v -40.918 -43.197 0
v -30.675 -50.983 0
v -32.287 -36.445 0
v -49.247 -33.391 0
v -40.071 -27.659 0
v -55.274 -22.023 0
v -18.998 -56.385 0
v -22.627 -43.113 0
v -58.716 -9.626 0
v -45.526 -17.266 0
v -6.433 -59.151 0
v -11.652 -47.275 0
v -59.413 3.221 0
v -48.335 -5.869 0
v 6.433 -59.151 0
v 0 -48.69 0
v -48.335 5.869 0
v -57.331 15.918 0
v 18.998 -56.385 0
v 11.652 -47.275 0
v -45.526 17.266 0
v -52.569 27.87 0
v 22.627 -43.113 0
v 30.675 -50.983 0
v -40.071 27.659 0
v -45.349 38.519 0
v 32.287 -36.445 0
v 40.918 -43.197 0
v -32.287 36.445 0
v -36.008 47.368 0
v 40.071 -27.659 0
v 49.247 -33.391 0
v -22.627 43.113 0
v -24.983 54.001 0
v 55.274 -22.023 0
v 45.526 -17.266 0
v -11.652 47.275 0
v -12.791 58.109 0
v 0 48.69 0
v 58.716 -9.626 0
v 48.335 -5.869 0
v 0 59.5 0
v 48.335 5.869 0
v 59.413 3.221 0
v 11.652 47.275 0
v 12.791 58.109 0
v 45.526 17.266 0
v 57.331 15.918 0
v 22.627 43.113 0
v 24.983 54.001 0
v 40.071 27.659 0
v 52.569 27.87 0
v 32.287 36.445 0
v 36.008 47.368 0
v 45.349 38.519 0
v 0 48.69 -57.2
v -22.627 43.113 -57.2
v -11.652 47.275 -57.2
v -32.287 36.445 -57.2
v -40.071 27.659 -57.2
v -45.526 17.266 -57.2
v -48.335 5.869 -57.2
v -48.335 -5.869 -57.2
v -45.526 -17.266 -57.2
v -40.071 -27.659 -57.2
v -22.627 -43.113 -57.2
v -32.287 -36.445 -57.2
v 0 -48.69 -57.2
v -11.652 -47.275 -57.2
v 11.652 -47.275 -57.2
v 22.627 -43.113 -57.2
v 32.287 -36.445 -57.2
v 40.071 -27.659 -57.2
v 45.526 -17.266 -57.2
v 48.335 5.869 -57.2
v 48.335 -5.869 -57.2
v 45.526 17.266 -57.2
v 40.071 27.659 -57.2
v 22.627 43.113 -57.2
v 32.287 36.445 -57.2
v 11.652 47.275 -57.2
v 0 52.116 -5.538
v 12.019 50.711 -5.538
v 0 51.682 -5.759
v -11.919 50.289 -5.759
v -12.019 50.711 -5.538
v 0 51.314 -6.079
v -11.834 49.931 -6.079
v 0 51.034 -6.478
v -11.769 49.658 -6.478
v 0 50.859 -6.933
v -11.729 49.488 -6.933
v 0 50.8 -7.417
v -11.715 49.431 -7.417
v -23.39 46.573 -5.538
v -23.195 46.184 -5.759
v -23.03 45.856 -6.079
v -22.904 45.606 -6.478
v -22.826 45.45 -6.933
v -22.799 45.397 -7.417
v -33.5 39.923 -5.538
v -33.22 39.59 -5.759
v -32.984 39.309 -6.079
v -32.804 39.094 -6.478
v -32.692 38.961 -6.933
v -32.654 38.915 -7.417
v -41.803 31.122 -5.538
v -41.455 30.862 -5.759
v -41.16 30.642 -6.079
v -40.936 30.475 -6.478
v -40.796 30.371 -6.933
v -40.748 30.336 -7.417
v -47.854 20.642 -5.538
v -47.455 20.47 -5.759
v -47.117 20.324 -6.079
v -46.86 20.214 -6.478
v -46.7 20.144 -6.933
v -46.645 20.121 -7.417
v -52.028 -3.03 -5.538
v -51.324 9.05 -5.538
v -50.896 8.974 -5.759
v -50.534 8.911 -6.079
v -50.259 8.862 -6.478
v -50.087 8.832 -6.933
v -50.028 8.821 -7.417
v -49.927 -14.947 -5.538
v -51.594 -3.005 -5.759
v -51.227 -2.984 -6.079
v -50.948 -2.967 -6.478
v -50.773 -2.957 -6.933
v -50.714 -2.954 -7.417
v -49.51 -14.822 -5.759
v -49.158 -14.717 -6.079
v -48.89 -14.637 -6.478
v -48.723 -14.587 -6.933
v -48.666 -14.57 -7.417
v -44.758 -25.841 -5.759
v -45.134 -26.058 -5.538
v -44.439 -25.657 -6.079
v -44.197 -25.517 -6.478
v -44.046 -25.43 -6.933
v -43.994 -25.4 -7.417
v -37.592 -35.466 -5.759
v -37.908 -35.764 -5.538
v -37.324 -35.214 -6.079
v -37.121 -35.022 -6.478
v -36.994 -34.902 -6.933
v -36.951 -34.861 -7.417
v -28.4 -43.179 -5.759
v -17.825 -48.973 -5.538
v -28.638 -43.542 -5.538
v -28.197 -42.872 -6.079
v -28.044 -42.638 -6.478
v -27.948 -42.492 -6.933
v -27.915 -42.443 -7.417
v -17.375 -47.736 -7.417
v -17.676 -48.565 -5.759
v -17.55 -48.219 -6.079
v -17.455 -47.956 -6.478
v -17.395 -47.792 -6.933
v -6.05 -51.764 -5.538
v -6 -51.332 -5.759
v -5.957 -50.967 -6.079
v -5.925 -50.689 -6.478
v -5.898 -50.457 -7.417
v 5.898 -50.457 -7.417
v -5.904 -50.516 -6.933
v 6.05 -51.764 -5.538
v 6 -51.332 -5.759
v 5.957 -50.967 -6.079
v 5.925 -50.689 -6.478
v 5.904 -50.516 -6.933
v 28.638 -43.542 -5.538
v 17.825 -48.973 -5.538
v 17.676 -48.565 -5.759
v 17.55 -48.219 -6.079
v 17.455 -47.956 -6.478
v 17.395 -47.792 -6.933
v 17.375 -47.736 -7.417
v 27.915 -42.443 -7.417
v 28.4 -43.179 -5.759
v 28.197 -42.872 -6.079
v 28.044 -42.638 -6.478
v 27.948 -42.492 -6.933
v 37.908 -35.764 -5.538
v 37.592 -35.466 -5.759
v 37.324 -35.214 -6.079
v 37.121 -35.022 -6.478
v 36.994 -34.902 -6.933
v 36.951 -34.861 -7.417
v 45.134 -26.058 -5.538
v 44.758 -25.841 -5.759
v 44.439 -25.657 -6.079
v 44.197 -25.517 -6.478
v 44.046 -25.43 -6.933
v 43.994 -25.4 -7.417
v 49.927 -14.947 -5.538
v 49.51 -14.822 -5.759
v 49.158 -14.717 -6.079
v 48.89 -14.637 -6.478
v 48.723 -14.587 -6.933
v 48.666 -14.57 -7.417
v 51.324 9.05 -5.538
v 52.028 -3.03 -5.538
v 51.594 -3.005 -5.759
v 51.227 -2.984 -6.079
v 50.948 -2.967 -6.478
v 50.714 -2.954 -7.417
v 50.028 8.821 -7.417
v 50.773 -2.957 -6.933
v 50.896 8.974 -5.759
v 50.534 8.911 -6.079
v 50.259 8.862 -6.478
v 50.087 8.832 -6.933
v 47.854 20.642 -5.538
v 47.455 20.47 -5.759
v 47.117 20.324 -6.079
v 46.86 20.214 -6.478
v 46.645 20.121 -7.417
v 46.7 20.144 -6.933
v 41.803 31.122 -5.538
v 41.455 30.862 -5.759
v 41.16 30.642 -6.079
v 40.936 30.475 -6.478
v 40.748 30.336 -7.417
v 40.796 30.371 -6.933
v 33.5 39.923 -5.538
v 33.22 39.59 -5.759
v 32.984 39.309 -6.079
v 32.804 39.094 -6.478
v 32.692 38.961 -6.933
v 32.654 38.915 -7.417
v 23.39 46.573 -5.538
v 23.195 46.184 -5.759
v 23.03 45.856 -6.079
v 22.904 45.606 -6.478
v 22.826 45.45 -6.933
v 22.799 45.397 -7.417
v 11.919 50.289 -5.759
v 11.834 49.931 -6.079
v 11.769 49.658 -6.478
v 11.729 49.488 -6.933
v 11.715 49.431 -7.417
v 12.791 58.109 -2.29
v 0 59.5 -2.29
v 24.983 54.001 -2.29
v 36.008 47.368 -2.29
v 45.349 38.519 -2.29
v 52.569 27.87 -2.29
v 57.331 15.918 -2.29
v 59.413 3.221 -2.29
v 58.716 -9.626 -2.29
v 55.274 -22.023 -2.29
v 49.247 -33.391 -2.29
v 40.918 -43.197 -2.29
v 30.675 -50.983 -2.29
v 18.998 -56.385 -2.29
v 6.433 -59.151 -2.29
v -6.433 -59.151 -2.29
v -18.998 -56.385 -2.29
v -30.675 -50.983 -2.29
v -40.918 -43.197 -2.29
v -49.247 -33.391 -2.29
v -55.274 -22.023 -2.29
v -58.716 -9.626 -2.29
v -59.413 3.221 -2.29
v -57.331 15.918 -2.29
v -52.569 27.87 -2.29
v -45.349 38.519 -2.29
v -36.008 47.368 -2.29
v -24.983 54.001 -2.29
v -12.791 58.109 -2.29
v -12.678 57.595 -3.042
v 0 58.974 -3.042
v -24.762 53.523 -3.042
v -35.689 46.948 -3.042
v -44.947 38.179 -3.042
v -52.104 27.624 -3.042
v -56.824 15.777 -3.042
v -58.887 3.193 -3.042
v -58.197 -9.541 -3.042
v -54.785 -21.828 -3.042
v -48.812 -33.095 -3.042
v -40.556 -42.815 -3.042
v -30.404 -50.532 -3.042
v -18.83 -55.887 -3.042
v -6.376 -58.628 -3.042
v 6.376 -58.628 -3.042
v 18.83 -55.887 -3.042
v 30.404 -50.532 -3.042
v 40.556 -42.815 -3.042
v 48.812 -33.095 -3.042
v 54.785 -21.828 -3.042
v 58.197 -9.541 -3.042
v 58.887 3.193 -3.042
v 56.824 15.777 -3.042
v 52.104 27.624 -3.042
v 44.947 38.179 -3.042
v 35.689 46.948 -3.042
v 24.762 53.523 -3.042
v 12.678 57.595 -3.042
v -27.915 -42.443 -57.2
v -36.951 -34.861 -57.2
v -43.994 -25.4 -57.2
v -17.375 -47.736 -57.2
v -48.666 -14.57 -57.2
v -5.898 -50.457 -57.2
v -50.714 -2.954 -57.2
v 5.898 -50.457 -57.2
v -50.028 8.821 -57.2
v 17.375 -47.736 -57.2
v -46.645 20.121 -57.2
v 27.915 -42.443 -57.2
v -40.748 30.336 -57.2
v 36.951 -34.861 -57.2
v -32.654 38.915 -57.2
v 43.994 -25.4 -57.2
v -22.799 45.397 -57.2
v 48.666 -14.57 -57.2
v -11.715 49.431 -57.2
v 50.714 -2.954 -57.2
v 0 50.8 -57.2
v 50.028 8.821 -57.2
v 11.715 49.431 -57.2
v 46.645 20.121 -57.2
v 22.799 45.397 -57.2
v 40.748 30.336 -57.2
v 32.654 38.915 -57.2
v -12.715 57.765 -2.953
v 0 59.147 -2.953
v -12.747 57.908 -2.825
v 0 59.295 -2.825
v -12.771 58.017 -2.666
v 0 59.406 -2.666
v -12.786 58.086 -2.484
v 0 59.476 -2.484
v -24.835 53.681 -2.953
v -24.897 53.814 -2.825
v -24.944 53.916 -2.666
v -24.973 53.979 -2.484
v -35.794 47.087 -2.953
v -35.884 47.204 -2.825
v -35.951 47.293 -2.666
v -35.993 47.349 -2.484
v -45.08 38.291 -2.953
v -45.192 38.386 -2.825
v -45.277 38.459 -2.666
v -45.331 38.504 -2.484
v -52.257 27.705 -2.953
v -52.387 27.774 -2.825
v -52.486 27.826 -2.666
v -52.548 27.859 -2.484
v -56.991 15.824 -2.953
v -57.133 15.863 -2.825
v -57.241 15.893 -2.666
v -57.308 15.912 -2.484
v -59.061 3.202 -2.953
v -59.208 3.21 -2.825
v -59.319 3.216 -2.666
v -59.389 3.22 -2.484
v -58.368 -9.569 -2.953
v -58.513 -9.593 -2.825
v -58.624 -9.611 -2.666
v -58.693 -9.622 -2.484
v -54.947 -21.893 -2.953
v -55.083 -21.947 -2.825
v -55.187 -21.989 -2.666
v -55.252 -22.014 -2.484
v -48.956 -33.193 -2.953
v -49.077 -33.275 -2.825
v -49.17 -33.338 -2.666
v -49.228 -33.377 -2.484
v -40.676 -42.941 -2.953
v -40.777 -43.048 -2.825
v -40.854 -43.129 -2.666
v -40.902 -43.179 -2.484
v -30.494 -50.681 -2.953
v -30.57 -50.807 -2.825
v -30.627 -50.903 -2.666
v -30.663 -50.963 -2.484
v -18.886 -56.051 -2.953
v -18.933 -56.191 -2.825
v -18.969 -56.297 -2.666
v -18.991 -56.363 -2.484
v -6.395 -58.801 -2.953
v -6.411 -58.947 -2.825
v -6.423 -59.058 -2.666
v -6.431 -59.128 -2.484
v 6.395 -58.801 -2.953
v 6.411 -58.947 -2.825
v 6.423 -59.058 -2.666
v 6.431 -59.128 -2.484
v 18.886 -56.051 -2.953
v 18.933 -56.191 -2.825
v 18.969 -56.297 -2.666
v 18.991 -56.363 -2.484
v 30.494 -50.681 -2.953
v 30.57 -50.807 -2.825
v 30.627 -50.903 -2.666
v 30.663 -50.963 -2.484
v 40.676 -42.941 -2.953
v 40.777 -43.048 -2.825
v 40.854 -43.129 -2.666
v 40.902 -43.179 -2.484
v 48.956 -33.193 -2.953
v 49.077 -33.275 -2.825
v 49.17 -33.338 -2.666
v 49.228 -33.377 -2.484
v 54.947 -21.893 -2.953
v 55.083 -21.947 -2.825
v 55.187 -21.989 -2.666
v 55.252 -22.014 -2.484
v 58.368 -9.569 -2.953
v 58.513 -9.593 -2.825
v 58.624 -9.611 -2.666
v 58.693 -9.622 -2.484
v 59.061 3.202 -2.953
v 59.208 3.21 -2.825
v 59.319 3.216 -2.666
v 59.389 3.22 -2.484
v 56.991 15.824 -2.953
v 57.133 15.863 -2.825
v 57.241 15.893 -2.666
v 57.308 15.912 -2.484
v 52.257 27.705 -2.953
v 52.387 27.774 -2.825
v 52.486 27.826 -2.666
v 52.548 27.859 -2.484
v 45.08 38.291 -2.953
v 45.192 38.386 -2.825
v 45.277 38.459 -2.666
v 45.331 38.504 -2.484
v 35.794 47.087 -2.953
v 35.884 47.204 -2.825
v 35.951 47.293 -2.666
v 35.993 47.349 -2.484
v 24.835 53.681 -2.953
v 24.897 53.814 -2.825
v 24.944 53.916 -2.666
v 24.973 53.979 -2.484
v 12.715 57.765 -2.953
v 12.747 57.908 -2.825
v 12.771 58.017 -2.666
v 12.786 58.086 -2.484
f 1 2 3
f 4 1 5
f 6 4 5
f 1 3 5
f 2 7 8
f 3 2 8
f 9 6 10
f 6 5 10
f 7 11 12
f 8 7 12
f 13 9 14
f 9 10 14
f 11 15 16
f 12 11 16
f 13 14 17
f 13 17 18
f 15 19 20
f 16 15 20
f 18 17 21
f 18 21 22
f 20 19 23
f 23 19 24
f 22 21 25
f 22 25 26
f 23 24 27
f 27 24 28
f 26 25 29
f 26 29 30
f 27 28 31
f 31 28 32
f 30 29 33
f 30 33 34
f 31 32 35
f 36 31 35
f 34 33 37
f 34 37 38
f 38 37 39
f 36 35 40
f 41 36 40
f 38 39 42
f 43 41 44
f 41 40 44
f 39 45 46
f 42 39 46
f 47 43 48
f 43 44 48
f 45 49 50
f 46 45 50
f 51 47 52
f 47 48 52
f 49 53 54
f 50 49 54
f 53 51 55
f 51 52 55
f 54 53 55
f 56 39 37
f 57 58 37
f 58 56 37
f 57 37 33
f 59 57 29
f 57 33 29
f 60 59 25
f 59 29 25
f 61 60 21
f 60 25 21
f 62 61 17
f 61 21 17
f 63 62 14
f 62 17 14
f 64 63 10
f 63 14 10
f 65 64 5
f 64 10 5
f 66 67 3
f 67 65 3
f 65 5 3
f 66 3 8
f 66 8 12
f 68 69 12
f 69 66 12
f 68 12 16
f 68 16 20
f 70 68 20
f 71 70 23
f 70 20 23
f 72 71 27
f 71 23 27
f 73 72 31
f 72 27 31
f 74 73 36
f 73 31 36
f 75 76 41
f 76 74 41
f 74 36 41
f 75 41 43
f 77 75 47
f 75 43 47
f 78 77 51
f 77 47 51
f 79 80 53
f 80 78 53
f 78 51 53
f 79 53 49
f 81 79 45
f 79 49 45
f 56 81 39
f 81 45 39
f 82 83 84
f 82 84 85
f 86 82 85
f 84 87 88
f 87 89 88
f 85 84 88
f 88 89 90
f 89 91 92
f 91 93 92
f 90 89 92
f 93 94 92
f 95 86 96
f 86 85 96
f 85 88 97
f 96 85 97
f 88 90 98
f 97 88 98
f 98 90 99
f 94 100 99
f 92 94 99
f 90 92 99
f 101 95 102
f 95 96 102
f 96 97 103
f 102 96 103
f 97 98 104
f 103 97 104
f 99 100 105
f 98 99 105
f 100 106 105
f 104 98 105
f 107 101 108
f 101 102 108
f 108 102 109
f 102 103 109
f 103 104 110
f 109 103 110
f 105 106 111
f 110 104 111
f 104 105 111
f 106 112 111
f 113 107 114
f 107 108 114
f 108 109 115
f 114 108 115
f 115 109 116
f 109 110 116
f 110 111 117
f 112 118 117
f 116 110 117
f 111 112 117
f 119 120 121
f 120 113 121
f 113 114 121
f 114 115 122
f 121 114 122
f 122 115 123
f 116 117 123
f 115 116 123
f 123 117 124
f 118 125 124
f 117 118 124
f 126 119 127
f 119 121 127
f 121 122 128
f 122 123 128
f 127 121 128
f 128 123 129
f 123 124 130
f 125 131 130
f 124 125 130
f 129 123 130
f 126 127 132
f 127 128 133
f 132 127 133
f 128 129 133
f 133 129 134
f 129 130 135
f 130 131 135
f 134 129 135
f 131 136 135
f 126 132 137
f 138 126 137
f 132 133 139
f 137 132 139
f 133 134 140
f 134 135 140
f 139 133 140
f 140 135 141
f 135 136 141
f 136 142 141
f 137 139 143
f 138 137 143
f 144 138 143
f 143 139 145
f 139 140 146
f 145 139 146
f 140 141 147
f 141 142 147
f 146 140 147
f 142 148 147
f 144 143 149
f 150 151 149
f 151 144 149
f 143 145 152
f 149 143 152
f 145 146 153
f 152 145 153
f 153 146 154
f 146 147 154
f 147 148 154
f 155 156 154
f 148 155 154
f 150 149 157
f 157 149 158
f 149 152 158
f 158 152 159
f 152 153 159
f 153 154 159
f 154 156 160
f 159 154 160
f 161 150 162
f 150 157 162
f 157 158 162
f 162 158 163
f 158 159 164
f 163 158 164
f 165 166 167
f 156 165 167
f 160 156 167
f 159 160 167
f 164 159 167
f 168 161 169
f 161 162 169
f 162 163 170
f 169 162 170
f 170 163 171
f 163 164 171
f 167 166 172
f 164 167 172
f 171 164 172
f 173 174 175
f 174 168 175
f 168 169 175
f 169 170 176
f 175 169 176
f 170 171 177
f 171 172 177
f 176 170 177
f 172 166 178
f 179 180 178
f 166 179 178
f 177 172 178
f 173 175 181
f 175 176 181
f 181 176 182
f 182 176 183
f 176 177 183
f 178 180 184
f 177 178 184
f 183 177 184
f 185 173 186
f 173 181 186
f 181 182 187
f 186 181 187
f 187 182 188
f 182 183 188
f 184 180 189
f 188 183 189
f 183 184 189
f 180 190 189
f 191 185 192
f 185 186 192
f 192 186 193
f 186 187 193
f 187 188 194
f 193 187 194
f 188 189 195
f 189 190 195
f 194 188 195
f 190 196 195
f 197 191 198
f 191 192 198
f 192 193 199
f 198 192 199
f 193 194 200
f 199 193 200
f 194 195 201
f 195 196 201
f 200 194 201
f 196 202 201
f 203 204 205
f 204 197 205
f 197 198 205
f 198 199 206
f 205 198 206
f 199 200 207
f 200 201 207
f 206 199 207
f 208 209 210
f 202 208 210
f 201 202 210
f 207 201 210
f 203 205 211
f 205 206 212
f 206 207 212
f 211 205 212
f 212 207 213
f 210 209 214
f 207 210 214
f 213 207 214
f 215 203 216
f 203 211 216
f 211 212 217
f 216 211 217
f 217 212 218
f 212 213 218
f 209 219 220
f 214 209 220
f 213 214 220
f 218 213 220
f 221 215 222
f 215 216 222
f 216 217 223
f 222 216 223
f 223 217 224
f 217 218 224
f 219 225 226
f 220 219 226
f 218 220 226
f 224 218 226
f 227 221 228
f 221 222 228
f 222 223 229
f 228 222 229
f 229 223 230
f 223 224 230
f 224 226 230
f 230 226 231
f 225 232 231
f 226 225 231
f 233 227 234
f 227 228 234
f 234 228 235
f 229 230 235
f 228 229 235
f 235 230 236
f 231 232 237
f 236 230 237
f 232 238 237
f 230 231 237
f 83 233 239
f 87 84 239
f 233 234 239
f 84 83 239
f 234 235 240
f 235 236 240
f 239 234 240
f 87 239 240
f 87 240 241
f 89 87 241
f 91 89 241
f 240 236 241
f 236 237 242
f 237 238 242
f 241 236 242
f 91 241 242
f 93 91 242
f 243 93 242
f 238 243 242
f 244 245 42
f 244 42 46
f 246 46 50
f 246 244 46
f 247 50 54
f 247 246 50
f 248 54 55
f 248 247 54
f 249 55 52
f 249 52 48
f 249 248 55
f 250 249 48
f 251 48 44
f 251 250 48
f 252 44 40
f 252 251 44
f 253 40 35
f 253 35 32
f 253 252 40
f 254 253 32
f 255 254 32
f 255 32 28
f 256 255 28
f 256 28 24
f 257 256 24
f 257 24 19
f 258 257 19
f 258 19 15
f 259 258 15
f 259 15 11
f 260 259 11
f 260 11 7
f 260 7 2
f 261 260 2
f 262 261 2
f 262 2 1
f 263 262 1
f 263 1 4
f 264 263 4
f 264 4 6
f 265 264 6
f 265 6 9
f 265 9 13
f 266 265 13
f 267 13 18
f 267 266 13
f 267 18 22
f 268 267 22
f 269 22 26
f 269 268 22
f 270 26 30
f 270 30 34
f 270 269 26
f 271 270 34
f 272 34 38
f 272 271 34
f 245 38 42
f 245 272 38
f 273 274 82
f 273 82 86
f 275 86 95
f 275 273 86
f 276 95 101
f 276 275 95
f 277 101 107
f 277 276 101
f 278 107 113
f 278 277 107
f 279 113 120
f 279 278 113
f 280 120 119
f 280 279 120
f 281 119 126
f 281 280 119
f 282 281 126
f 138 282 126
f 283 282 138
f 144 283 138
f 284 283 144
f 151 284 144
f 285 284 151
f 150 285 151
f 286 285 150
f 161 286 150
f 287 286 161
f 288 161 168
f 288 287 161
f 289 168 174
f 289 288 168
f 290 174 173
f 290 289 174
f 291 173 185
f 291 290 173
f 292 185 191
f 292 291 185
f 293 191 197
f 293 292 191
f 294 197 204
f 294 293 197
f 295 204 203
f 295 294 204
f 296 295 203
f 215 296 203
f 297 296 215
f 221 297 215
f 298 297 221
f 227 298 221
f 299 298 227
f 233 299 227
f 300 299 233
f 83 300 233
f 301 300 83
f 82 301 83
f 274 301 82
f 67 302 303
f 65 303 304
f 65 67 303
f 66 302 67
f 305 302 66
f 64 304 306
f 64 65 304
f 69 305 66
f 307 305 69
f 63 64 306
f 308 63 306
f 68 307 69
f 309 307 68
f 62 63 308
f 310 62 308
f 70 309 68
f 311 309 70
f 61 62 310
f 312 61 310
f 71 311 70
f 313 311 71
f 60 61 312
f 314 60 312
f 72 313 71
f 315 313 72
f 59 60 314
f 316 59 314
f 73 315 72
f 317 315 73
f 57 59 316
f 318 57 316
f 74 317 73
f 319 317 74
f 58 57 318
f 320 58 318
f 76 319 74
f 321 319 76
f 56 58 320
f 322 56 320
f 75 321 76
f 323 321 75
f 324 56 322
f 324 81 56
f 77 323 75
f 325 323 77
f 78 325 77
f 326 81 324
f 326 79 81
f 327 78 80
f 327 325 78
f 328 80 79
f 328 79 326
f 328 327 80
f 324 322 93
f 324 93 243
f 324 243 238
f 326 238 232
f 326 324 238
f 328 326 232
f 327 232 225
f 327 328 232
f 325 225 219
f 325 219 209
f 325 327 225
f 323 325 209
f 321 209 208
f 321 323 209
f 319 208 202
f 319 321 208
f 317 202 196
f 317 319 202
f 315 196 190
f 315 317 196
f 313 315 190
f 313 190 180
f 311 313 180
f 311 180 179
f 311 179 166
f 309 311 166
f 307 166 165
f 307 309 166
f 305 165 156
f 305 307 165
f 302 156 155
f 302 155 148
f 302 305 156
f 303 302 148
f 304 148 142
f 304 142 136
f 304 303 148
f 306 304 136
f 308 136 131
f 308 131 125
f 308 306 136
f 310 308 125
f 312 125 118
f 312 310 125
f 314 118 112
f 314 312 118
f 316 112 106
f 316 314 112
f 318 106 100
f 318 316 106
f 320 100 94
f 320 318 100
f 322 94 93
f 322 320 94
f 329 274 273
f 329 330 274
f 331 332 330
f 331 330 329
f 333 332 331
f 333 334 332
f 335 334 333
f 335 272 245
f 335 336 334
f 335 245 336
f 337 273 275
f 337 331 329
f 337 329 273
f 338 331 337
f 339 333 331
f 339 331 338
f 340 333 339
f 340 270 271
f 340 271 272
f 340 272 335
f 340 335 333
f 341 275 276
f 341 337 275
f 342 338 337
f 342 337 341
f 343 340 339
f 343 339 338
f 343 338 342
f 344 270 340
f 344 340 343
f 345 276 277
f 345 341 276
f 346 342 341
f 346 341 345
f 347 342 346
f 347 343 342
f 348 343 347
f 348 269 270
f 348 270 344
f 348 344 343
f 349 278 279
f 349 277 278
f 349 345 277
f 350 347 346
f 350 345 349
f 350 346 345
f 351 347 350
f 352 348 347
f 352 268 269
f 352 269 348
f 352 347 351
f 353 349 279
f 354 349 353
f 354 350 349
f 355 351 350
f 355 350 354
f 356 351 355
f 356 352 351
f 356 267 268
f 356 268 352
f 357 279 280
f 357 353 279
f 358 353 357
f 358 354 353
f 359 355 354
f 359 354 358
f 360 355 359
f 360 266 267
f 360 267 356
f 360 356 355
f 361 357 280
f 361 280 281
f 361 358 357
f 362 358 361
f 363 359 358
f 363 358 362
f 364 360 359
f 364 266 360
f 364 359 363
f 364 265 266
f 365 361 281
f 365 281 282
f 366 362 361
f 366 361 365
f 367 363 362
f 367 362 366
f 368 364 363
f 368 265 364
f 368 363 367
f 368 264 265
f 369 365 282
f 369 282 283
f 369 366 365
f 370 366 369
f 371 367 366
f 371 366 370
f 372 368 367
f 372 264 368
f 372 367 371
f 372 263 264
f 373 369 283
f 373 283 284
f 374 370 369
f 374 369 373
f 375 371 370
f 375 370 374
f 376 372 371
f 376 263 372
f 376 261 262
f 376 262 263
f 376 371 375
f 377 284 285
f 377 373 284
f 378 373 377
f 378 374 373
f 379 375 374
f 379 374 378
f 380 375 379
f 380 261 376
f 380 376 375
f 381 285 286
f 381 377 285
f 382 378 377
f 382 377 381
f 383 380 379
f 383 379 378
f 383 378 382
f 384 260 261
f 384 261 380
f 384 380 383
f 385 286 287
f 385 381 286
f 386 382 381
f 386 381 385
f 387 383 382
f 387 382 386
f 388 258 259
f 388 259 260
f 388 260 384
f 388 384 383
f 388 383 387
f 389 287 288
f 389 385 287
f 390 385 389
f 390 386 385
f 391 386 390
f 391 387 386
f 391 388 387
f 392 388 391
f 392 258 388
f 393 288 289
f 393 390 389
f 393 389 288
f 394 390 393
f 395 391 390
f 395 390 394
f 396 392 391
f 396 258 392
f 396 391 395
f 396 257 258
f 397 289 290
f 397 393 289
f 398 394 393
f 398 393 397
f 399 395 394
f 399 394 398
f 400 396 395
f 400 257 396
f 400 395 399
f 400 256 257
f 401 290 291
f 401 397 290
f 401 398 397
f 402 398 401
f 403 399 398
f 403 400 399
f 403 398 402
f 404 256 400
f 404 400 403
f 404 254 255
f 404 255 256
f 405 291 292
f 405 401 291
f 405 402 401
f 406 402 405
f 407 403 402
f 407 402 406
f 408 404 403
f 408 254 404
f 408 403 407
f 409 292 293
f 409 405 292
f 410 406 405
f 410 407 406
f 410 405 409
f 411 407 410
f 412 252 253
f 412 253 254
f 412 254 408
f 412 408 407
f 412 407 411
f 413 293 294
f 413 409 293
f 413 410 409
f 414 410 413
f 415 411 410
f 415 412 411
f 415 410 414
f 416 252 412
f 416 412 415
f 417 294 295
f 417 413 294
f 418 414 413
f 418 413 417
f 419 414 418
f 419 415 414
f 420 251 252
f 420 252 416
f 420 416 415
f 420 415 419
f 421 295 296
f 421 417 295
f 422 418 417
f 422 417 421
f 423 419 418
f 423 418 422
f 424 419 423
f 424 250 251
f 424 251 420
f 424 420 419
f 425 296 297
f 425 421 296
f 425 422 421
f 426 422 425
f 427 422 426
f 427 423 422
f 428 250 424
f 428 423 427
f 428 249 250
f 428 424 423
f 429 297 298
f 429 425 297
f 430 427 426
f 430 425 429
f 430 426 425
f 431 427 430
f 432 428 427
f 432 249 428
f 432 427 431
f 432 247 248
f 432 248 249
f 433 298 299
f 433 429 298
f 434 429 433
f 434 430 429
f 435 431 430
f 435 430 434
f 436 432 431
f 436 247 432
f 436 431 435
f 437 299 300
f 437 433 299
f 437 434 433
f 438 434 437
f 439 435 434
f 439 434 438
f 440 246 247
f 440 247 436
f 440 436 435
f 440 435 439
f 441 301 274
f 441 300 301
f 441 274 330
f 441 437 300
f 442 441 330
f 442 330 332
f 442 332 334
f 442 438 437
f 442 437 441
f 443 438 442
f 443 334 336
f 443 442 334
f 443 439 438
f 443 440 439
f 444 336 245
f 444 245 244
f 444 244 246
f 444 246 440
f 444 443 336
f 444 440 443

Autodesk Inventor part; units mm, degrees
ref_plane "YZ Plane" through (0, 0, 0) normal (1, 0, 0) x (0, 1, 0)
ref_plane "XZ Plane" through (0, 0, 0) normal (0, 1, 0) x (-1, 0, 0)
ref_plane "XY Plane" through (0, 0, 0) normal (0, 0, 1) x (1, 0, 0)
sketch "Sketch2" plane through (0, 0, 0) normal (1, 0, 0) x (0, 1, 0)
  line L0 (0, 0) -> (0, -57.2)
  line L1 (48.69, -57.2) -> (48.69, 0)
  line L2 (48.69, 0) -> (59.5, 0)
  line L3 (59.5, 0) -> (59.5, -2.29)
  line L4 (58.9736, -3.0418) -> (52.116, -5.5377)
  line L5 (50.8, -7.4171) -> (50.8, -57.2)
  line L6 (50.8, -57.2) -> (48.69, -57.2)
  arc A0 (58.9736, -3.0418) -> (59.5, -2.29) centre (58.7, -2.29) ccw
  arc A1 (52.116, -5.5377) -> (50.8, -7.4171) centre (52.8, -7.4171) ccw
  dimension "OD" = 101.6
  dimension "THW" = 2.11
  dimension "L" = 57.2
  dimension "d3" = 119
  dimension "d4" = 0.8
  dimension "d5" = 2.29
  dimension "d6" = 2
  dimension "d7" = 20
revolve "Revolution1" add sketch "Sketch2" angle 360 about axis through (0, 0, 0) along (0, 0, -1)
properties part number "Ferrule-101.6" material "Stainless Steel, 316L"
